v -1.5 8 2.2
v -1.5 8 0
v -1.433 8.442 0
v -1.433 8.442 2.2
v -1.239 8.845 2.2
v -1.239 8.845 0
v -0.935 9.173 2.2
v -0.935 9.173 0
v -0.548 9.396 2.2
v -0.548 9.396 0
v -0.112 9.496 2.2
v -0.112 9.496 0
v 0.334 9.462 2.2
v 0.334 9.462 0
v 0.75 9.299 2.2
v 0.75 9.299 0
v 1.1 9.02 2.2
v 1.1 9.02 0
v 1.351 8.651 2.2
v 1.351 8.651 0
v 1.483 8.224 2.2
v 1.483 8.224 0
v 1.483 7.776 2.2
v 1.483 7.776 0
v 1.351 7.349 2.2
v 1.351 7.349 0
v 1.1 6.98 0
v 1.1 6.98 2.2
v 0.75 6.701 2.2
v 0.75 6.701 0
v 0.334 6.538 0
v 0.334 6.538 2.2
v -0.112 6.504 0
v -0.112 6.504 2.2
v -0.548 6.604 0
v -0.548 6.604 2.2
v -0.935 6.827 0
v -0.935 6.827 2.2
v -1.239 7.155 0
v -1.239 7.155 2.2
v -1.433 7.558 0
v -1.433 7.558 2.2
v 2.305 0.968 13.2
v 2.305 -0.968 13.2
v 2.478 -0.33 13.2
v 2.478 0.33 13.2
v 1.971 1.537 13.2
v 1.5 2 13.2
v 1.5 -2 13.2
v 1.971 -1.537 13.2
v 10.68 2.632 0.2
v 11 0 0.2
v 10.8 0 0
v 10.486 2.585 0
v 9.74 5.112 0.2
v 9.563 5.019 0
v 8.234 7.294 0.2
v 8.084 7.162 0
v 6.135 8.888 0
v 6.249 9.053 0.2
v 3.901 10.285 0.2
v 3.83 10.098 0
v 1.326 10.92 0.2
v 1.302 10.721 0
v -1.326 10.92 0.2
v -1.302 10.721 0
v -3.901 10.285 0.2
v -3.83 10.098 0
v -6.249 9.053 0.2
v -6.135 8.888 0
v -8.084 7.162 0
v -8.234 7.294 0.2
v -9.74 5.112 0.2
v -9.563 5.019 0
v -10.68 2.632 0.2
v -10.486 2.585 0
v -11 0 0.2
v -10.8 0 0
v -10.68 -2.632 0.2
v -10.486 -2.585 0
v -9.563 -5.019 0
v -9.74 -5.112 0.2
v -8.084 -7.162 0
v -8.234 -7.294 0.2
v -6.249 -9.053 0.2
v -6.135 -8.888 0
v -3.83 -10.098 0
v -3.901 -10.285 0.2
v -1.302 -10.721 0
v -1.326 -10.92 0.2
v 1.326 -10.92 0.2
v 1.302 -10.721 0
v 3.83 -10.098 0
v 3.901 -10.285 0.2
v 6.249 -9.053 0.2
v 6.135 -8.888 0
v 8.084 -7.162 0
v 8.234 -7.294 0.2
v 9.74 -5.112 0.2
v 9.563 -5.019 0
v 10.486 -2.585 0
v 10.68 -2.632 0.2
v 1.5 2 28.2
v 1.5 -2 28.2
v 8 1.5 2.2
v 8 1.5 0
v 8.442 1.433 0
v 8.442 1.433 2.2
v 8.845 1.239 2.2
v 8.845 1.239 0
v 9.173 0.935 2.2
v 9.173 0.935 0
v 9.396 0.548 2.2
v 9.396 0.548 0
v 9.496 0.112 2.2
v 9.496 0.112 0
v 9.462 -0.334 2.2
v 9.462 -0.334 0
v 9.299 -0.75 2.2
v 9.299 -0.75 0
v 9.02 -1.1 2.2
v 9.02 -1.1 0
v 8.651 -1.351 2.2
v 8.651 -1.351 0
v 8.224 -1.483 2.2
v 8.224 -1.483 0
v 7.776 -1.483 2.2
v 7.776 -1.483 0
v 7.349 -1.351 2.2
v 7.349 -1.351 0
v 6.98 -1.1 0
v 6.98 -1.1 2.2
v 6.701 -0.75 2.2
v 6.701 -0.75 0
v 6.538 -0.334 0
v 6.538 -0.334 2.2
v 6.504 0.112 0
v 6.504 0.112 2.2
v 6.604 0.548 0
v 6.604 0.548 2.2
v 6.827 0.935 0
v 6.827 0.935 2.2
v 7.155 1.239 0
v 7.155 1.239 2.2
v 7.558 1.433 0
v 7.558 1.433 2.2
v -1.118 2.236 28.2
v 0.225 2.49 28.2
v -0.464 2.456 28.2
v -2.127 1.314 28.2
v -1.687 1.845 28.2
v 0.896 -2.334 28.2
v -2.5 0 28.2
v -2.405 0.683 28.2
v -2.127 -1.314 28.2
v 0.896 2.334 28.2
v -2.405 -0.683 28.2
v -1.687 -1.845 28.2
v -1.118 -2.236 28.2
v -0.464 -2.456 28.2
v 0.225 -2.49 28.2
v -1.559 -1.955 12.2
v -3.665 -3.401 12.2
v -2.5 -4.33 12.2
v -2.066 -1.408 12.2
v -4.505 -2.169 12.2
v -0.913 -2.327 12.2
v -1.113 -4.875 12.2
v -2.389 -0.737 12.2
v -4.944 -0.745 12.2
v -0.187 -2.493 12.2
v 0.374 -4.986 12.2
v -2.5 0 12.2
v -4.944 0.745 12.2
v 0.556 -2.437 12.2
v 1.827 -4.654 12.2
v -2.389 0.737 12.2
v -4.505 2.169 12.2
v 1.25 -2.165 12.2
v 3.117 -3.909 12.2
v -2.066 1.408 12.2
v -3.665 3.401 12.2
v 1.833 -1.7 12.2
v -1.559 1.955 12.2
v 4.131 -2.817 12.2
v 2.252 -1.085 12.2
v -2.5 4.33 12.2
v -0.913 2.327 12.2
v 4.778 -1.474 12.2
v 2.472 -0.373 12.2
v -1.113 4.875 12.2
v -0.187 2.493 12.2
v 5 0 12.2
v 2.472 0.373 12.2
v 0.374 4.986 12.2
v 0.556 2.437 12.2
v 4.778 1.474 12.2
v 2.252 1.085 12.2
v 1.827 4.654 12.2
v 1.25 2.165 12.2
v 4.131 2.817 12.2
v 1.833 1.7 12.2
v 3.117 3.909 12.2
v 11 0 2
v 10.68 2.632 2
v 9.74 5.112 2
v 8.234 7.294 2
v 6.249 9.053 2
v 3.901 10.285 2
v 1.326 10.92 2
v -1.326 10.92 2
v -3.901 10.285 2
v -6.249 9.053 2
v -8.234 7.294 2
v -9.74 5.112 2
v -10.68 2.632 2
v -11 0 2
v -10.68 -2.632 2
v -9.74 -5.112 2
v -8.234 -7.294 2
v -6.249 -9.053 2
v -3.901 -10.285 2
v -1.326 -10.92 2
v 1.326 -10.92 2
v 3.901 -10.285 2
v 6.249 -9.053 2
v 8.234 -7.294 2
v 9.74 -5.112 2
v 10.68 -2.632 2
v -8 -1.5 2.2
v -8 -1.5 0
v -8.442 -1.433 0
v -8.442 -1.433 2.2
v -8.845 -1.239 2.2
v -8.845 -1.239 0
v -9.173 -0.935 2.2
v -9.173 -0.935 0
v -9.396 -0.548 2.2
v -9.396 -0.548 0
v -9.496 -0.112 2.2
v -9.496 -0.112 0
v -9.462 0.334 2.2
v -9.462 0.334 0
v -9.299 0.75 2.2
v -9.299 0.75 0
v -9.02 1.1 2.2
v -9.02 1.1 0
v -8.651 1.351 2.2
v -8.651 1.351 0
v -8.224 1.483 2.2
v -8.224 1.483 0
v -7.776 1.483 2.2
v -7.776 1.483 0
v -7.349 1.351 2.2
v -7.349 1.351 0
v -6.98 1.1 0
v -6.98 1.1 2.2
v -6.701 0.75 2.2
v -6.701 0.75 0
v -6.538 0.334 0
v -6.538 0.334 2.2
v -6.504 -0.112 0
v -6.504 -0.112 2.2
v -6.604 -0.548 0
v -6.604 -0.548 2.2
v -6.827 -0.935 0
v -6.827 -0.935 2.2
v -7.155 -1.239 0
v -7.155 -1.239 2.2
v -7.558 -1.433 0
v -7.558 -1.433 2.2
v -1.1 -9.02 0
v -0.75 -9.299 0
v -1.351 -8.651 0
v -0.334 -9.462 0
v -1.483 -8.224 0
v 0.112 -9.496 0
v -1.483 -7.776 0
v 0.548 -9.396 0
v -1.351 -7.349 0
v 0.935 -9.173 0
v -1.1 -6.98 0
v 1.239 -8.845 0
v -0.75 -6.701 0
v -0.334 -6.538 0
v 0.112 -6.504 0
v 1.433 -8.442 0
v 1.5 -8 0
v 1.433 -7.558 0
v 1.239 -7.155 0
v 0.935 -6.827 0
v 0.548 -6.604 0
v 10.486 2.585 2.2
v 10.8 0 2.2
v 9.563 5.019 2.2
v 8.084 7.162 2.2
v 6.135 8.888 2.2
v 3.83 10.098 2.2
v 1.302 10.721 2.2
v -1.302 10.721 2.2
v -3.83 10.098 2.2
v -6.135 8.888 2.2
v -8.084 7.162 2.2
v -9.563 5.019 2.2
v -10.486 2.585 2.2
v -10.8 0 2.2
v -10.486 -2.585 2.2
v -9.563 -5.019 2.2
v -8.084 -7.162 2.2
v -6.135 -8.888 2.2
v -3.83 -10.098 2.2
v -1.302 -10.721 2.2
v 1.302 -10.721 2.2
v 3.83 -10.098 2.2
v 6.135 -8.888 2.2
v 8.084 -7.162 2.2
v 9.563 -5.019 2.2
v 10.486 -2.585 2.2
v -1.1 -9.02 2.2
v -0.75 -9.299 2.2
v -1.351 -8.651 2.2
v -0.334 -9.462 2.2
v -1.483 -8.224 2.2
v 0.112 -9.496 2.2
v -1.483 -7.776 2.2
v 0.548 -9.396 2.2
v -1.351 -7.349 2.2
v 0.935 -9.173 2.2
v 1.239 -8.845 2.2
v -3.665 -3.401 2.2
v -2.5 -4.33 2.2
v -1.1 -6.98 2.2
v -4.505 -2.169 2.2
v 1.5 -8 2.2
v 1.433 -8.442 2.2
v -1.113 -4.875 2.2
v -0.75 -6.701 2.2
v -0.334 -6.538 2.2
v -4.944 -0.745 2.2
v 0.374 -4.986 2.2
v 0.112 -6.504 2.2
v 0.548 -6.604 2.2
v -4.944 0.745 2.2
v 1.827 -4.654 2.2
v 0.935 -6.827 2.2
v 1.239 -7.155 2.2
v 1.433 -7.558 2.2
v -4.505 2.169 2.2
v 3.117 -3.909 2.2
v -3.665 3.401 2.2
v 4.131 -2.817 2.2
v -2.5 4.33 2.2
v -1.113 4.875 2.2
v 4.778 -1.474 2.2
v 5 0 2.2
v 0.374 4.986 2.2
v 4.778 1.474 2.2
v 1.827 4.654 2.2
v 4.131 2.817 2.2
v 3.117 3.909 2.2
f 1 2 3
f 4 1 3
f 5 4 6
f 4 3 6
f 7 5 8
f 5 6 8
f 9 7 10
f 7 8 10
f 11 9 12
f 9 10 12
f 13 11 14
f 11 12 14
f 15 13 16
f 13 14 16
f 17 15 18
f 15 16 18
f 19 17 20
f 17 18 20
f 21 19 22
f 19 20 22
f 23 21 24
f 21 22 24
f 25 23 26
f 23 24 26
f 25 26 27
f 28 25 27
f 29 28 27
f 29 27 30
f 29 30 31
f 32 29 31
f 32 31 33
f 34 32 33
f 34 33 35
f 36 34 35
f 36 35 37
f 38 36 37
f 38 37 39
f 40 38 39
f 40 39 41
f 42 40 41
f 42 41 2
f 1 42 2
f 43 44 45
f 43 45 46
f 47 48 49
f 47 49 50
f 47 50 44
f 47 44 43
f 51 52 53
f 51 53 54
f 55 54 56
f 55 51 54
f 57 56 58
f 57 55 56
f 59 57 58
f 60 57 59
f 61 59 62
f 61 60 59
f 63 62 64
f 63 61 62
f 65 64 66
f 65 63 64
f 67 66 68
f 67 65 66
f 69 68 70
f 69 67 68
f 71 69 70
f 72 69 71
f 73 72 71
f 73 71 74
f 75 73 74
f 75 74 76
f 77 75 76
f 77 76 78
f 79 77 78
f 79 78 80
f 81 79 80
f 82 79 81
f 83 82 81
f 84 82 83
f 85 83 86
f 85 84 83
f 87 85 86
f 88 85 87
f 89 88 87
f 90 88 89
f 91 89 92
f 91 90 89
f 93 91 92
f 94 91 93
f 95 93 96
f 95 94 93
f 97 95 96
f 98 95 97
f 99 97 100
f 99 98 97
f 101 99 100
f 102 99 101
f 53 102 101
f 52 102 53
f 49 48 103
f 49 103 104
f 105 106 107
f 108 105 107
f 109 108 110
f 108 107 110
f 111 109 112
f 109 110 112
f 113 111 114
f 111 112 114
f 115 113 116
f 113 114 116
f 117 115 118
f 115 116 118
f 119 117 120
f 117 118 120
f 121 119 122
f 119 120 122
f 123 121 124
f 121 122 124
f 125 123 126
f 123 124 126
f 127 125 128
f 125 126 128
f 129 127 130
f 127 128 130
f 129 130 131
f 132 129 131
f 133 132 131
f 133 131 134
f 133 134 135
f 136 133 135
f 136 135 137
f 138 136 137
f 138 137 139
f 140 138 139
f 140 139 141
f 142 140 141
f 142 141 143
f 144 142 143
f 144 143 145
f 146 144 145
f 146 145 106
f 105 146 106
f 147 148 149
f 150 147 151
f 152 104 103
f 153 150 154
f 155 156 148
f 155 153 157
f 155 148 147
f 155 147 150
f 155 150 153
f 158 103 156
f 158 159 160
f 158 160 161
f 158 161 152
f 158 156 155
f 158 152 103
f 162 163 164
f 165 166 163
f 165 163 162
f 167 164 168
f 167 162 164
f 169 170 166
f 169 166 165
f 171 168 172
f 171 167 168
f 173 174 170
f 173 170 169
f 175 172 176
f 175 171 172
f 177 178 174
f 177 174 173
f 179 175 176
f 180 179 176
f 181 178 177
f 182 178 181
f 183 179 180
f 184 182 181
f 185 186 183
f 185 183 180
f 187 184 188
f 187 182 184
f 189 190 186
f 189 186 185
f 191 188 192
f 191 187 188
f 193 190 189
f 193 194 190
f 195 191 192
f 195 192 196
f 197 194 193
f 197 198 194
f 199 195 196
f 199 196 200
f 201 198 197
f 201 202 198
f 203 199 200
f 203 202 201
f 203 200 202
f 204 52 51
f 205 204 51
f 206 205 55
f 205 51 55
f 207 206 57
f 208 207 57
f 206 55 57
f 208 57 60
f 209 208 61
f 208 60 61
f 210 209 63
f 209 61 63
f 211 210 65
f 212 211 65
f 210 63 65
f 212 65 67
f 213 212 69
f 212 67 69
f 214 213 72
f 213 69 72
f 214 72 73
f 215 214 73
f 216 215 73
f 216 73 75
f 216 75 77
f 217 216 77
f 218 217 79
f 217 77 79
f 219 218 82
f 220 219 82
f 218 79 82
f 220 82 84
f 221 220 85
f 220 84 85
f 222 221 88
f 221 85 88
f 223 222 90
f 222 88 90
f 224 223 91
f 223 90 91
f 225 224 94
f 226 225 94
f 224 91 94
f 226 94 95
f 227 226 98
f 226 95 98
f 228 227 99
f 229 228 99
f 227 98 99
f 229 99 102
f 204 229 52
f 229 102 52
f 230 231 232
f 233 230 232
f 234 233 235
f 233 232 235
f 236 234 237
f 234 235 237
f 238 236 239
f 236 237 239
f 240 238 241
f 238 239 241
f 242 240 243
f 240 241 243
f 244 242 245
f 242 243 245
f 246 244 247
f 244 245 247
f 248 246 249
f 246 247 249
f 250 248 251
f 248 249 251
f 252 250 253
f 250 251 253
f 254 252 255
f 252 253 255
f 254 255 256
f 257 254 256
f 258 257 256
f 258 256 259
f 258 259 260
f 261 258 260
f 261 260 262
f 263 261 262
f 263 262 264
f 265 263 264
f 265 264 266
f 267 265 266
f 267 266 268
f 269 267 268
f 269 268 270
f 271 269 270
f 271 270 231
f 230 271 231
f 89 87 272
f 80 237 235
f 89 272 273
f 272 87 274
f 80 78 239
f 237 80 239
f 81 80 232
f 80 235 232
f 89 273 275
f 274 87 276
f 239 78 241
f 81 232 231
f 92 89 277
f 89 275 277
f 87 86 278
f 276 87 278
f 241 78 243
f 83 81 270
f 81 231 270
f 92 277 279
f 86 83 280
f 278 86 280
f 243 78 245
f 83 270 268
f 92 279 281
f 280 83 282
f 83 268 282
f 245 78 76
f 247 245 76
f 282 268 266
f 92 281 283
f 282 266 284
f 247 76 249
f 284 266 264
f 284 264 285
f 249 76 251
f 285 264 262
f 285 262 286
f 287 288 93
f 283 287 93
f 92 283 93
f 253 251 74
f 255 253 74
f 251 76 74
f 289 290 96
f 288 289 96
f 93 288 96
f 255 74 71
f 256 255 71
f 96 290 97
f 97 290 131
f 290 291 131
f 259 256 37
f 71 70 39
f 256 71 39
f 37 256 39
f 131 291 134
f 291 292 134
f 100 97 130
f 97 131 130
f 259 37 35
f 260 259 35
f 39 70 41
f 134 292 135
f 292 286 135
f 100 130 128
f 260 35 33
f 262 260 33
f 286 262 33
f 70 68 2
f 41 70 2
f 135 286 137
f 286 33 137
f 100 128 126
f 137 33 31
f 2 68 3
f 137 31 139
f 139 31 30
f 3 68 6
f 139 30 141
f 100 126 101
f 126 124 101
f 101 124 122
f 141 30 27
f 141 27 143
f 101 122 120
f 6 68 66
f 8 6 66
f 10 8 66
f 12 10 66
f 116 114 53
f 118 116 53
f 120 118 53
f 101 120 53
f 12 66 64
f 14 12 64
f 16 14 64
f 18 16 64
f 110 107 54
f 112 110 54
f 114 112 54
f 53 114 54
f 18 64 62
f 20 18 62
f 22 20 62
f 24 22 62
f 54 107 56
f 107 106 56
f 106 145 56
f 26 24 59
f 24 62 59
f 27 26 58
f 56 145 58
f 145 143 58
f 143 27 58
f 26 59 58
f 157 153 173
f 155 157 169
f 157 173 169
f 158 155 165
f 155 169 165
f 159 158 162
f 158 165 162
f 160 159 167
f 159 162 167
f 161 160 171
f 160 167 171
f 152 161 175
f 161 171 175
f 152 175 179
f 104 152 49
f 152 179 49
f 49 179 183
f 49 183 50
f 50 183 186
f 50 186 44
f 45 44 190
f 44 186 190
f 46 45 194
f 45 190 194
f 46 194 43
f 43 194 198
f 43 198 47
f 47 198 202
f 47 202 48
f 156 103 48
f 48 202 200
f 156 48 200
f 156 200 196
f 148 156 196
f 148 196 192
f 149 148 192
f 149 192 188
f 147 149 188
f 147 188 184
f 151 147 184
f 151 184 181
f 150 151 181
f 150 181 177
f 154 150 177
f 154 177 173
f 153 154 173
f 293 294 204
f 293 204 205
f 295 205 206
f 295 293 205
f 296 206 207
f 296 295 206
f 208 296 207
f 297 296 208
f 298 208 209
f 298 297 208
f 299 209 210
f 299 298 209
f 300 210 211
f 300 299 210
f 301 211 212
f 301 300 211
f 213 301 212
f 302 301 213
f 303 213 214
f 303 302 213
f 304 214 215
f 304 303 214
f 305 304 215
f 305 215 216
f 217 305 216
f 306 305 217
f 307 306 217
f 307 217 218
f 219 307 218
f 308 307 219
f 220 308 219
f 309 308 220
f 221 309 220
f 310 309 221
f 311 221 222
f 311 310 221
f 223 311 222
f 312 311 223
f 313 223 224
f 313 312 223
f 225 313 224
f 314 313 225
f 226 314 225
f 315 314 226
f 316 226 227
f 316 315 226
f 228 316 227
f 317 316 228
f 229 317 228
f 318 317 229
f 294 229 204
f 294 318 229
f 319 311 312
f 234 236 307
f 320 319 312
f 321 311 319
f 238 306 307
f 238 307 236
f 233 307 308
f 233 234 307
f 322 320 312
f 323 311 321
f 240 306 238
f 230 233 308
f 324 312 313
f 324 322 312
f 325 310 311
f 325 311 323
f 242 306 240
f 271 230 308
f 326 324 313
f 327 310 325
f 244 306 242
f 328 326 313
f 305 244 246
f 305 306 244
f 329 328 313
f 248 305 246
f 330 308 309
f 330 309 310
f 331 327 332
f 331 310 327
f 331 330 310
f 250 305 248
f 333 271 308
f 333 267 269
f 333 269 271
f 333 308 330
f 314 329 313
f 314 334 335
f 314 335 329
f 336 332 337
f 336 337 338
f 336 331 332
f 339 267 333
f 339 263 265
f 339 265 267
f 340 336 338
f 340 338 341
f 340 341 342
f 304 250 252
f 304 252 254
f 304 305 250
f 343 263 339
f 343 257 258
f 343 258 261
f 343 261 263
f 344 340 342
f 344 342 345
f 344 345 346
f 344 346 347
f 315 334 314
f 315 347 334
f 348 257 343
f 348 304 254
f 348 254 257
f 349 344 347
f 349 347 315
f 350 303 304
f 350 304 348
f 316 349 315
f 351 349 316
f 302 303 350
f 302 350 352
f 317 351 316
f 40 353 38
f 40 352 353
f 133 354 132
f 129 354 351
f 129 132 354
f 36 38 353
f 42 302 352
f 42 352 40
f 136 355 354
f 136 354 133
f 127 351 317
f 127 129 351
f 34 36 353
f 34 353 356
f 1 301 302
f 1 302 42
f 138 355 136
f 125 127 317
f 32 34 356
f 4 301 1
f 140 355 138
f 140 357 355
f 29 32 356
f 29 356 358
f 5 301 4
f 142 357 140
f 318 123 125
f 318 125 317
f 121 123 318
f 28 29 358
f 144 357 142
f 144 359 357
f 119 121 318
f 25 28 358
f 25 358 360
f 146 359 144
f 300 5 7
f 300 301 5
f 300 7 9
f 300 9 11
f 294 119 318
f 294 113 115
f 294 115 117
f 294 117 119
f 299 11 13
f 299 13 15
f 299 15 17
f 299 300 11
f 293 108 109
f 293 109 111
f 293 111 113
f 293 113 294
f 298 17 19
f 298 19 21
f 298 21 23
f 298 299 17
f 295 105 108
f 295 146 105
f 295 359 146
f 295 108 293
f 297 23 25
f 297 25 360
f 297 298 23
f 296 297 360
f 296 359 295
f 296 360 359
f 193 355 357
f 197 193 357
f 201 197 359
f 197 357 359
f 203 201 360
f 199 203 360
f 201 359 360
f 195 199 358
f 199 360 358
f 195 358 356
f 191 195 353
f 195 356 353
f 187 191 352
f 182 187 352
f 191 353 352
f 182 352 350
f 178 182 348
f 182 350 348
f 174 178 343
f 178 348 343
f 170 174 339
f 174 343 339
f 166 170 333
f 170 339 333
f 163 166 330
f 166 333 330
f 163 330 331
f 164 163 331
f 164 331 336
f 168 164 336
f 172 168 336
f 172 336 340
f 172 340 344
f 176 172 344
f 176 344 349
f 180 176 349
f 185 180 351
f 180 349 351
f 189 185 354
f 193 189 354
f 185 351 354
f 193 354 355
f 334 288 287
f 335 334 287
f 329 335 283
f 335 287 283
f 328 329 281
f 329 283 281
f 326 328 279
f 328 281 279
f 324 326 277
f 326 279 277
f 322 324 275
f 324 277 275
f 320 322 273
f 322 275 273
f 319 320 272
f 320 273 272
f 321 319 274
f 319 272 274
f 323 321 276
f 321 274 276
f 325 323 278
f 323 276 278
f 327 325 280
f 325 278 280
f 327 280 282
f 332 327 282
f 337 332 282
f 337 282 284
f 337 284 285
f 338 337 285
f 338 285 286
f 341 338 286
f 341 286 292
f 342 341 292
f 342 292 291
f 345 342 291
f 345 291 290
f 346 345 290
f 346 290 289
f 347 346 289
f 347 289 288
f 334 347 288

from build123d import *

# Parameters (mm, degrees)
SKETCH_1_R               = 11
SKETCH_1_R_2             = 5
EXTRUDE_1_DEPTH          = 2.2
SKETCH_2_R               = 5
EXTRUDE_2_DEPTH          = 10
F_3_0MM_1_D              = 3
PATTERN_CIRCULAR_1_COUNT = 4
CHAMFER_3_SIZE           = 0.2
SKETCH_12_R              = 2.5
EXTRUDE_1789_DEPTH       = 26
CUT_EXTRUDE_START        = -15
CUT_EXTRUDE_1_DEPTH      = 15


with BuildPart() as part:
    # 草图1 → 凸台-拉伸1 (new body)
    # profile 1 of 2: a face of its own
    with BuildSketch(Plane.XY):
        Circle(SKETCH_1_R)
        Circle(SKETCH_1_R_2, mode=Mode.SUBTRACT)
    # profile 2 of 2: a face of its own
    with BuildSketch(Plane.XY):
        Circle(SKETCH_1_R_2)
    extrude(amount=EXTRUDE_1_DEPTH)

    # 草图2 → 凸台-拉伸2 (add)
    with BuildSketch(Plane.XY.offset(2.2)):
        Circle(SKETCH_2_R)
    extrude(amount=EXTRUDE_2_DEPTH)

    # Ø3.0mm 暗销孔1 (through all)
    with Locations(Plane.XY.offset(2.2)):
        with Locations((0, 8)):
            f_3_0mm_1 = Hole(F_3_0MM_1_D / 2)

    # 阵列(圆周)1: Ø3.0mm 暗销孔1 ×4 about axis
    pattern_circular_1_axis = Axis((0, 0, 0), (0, 0, 1))
    for i in range(1, PATTERN_CIRCULAR_1_COUNT):
        add(f_3_0mm_1.rotate(pattern_circular_1_axis, i * 360 / PATTERN_CIRCULAR_1_COUNT), mode=Mode.SUBTRACT)

    # 倒角3
    chamfer_3_edges = [part.edges().sort_by_distance(p)[0] for p in [
        (-11, 0, 0),
        (-11, 0, 2.2),
    ]]
    chamfer(chamfer_3_edges, length=CHAMFER_3_SIZE)

    # 草图12 → Extrude 1789 (add)
    with BuildSketch(Plane.XY.offset(2.2)):
        with Locations(Location((0, 0, 0), (0, 0, 180))):
            Circle(SKETCH_12_R)
    extrude(amount=EXTRUDE_1789_DEPTH)

    # 草图13 → 切除-拉伸1 (cut)
    with BuildSketch(Plane.XY.offset(28.2).offset(CUT_EXTRUDE_START)):
        with BuildLine():
            Line((1.5, 2), (1.5, -2))
            ThreePointArc((1.5, -2), (2.5, 0), (1.5, 2))
        make_face()
    extrude(amount=CUT_EXTRUDE_1_DEPTH, mode=Mode.SUBTRACT)


solid = part.part
